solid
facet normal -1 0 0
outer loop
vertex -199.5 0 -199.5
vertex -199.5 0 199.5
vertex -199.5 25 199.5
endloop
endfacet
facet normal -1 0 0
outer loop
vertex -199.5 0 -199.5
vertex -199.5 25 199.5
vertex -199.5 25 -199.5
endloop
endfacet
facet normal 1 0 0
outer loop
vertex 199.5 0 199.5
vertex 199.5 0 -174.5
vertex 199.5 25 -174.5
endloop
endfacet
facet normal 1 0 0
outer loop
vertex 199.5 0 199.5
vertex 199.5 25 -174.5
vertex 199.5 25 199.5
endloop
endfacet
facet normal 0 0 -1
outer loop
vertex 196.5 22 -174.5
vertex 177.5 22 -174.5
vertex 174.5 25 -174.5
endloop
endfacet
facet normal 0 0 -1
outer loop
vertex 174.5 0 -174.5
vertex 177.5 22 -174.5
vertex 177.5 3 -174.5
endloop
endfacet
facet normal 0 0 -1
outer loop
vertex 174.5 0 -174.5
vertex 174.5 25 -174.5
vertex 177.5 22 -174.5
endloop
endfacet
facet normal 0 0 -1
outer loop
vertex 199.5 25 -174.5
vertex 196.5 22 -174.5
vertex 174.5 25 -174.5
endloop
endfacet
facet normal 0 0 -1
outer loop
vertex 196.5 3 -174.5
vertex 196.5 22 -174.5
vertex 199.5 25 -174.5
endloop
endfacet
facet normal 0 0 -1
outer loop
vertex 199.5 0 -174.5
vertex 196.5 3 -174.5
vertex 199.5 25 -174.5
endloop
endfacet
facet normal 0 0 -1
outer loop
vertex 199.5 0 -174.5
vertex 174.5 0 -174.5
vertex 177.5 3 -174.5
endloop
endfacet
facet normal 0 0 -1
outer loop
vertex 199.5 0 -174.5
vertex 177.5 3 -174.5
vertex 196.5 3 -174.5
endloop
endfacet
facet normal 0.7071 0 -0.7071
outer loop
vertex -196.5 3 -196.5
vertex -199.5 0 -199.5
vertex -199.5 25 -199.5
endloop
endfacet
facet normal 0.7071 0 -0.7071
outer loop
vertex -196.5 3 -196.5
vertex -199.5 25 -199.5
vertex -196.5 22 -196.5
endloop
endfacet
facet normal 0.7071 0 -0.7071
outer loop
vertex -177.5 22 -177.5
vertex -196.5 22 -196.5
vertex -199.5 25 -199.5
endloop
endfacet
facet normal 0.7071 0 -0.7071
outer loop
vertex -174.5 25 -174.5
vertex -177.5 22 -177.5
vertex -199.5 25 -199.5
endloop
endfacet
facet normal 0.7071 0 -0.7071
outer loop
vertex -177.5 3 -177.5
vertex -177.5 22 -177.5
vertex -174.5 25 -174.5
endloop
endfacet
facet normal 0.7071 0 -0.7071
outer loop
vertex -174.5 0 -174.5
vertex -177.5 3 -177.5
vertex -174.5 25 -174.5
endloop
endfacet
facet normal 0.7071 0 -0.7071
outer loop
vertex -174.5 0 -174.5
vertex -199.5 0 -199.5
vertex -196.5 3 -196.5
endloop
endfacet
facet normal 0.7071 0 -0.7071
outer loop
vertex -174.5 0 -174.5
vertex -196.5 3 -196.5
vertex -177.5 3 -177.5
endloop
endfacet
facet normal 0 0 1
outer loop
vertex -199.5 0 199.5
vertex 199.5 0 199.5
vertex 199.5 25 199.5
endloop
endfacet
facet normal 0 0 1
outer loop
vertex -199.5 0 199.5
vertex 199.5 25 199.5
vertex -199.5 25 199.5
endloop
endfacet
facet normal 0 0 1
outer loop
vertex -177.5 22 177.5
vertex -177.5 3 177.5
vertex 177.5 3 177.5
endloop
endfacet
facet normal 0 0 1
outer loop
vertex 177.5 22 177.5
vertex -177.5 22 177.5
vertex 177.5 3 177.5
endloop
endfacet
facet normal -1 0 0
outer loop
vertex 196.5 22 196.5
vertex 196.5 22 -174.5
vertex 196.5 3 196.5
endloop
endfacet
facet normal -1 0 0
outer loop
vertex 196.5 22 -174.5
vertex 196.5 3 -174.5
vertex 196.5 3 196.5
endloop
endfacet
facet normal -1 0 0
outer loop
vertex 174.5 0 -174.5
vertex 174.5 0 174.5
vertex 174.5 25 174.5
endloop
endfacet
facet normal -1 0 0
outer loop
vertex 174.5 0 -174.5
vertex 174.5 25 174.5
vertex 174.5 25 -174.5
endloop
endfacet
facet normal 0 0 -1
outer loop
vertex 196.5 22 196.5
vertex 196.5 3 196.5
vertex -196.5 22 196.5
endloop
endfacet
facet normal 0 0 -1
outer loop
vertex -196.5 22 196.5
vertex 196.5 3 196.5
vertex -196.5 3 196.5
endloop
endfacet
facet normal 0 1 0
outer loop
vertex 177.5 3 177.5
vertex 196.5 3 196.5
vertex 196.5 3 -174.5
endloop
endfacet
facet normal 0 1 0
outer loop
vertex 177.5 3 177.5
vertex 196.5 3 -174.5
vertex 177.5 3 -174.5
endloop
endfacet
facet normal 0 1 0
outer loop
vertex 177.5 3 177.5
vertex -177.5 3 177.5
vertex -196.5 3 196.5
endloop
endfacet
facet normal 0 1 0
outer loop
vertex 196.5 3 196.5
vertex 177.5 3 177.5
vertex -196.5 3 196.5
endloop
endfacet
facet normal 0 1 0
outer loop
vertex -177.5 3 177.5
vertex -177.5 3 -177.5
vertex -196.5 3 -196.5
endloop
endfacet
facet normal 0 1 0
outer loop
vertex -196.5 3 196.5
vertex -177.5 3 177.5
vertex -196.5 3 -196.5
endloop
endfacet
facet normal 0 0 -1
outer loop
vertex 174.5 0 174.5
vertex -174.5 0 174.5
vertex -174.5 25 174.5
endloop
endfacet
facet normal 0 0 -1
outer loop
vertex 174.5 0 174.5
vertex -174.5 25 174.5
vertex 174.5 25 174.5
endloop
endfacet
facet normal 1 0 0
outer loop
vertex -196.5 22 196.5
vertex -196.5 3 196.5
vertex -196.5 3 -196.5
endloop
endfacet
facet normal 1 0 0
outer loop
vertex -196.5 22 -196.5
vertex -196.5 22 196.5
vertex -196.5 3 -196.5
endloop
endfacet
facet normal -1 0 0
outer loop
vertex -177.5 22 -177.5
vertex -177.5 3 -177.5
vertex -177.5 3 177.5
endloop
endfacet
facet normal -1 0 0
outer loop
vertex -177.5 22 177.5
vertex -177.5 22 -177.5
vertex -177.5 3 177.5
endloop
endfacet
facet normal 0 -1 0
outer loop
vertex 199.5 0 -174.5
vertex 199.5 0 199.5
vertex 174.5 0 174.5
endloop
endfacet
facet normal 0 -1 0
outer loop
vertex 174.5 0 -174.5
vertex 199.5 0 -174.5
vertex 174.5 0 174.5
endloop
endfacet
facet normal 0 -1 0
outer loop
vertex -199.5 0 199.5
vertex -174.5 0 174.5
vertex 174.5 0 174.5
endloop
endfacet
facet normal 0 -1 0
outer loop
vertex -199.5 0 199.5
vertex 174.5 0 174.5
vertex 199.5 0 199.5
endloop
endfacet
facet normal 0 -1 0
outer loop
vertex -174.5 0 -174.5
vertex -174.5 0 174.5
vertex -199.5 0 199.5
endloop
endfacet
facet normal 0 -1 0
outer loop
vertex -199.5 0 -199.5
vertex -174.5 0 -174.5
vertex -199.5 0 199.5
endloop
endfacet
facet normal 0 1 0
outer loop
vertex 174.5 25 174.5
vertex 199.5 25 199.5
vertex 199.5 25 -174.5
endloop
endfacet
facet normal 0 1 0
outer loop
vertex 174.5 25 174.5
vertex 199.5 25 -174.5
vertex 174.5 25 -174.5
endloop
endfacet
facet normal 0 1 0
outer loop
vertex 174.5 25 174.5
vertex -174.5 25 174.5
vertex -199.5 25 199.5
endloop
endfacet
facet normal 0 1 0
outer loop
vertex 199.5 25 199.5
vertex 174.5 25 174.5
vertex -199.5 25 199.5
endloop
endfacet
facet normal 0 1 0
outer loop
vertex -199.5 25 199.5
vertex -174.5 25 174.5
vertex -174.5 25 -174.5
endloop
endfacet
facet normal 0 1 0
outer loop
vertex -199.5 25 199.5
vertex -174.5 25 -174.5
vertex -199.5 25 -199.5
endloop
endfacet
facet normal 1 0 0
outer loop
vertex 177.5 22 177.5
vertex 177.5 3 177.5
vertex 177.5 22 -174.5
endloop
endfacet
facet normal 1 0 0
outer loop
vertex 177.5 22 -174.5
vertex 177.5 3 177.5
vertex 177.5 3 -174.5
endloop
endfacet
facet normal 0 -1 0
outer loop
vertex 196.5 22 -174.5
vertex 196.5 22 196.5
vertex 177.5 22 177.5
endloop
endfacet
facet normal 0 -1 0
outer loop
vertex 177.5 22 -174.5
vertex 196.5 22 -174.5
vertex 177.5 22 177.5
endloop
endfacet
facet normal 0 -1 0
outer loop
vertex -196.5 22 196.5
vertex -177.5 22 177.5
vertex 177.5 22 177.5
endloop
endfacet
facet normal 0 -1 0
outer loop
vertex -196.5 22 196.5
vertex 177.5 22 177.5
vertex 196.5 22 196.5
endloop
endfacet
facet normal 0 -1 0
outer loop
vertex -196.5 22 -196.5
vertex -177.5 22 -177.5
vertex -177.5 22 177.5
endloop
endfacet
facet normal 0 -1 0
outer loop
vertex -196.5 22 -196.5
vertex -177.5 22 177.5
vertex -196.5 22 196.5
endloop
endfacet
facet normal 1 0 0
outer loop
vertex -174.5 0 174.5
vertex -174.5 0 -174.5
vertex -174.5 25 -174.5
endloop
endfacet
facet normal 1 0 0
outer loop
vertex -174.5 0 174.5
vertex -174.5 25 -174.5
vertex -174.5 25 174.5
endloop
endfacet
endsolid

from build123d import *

# Parameters (mm, degrees)
BOSS_EXTRUDE1_DEPTH = 25
SHELL1_T            = -3


with BuildPart() as part:
    # Sketch1 → Boss-Extrude1 (new body)
    with BuildSketch(Plane(origin=(0, 0, 0), x_dir=(1, 0, 0), z_dir=(0, 1, 0))):
        Polygon((-174.5, 174.5), (-174.5, -174.5), (174.5, -174.5), (174.5, 174.5), (199.5, 174.5), (199.5, -199.5), (-199.5, -199.5), (-199.5, 199.5), align=None)
    extrude(amount=BOSS_EXTRUDE1_DEPTH)

    # Shell1
    shell1_openings = [part.faces().sort_by_distance(p)[0] for p in [
        (187, 12.5, -174.5),
        (-187, 12.5, -187),
    ]]
    offset(amount=SHELL1_T, openings=shell1_openings, kind=Kind.INTERSECTION)


solid = part.part
